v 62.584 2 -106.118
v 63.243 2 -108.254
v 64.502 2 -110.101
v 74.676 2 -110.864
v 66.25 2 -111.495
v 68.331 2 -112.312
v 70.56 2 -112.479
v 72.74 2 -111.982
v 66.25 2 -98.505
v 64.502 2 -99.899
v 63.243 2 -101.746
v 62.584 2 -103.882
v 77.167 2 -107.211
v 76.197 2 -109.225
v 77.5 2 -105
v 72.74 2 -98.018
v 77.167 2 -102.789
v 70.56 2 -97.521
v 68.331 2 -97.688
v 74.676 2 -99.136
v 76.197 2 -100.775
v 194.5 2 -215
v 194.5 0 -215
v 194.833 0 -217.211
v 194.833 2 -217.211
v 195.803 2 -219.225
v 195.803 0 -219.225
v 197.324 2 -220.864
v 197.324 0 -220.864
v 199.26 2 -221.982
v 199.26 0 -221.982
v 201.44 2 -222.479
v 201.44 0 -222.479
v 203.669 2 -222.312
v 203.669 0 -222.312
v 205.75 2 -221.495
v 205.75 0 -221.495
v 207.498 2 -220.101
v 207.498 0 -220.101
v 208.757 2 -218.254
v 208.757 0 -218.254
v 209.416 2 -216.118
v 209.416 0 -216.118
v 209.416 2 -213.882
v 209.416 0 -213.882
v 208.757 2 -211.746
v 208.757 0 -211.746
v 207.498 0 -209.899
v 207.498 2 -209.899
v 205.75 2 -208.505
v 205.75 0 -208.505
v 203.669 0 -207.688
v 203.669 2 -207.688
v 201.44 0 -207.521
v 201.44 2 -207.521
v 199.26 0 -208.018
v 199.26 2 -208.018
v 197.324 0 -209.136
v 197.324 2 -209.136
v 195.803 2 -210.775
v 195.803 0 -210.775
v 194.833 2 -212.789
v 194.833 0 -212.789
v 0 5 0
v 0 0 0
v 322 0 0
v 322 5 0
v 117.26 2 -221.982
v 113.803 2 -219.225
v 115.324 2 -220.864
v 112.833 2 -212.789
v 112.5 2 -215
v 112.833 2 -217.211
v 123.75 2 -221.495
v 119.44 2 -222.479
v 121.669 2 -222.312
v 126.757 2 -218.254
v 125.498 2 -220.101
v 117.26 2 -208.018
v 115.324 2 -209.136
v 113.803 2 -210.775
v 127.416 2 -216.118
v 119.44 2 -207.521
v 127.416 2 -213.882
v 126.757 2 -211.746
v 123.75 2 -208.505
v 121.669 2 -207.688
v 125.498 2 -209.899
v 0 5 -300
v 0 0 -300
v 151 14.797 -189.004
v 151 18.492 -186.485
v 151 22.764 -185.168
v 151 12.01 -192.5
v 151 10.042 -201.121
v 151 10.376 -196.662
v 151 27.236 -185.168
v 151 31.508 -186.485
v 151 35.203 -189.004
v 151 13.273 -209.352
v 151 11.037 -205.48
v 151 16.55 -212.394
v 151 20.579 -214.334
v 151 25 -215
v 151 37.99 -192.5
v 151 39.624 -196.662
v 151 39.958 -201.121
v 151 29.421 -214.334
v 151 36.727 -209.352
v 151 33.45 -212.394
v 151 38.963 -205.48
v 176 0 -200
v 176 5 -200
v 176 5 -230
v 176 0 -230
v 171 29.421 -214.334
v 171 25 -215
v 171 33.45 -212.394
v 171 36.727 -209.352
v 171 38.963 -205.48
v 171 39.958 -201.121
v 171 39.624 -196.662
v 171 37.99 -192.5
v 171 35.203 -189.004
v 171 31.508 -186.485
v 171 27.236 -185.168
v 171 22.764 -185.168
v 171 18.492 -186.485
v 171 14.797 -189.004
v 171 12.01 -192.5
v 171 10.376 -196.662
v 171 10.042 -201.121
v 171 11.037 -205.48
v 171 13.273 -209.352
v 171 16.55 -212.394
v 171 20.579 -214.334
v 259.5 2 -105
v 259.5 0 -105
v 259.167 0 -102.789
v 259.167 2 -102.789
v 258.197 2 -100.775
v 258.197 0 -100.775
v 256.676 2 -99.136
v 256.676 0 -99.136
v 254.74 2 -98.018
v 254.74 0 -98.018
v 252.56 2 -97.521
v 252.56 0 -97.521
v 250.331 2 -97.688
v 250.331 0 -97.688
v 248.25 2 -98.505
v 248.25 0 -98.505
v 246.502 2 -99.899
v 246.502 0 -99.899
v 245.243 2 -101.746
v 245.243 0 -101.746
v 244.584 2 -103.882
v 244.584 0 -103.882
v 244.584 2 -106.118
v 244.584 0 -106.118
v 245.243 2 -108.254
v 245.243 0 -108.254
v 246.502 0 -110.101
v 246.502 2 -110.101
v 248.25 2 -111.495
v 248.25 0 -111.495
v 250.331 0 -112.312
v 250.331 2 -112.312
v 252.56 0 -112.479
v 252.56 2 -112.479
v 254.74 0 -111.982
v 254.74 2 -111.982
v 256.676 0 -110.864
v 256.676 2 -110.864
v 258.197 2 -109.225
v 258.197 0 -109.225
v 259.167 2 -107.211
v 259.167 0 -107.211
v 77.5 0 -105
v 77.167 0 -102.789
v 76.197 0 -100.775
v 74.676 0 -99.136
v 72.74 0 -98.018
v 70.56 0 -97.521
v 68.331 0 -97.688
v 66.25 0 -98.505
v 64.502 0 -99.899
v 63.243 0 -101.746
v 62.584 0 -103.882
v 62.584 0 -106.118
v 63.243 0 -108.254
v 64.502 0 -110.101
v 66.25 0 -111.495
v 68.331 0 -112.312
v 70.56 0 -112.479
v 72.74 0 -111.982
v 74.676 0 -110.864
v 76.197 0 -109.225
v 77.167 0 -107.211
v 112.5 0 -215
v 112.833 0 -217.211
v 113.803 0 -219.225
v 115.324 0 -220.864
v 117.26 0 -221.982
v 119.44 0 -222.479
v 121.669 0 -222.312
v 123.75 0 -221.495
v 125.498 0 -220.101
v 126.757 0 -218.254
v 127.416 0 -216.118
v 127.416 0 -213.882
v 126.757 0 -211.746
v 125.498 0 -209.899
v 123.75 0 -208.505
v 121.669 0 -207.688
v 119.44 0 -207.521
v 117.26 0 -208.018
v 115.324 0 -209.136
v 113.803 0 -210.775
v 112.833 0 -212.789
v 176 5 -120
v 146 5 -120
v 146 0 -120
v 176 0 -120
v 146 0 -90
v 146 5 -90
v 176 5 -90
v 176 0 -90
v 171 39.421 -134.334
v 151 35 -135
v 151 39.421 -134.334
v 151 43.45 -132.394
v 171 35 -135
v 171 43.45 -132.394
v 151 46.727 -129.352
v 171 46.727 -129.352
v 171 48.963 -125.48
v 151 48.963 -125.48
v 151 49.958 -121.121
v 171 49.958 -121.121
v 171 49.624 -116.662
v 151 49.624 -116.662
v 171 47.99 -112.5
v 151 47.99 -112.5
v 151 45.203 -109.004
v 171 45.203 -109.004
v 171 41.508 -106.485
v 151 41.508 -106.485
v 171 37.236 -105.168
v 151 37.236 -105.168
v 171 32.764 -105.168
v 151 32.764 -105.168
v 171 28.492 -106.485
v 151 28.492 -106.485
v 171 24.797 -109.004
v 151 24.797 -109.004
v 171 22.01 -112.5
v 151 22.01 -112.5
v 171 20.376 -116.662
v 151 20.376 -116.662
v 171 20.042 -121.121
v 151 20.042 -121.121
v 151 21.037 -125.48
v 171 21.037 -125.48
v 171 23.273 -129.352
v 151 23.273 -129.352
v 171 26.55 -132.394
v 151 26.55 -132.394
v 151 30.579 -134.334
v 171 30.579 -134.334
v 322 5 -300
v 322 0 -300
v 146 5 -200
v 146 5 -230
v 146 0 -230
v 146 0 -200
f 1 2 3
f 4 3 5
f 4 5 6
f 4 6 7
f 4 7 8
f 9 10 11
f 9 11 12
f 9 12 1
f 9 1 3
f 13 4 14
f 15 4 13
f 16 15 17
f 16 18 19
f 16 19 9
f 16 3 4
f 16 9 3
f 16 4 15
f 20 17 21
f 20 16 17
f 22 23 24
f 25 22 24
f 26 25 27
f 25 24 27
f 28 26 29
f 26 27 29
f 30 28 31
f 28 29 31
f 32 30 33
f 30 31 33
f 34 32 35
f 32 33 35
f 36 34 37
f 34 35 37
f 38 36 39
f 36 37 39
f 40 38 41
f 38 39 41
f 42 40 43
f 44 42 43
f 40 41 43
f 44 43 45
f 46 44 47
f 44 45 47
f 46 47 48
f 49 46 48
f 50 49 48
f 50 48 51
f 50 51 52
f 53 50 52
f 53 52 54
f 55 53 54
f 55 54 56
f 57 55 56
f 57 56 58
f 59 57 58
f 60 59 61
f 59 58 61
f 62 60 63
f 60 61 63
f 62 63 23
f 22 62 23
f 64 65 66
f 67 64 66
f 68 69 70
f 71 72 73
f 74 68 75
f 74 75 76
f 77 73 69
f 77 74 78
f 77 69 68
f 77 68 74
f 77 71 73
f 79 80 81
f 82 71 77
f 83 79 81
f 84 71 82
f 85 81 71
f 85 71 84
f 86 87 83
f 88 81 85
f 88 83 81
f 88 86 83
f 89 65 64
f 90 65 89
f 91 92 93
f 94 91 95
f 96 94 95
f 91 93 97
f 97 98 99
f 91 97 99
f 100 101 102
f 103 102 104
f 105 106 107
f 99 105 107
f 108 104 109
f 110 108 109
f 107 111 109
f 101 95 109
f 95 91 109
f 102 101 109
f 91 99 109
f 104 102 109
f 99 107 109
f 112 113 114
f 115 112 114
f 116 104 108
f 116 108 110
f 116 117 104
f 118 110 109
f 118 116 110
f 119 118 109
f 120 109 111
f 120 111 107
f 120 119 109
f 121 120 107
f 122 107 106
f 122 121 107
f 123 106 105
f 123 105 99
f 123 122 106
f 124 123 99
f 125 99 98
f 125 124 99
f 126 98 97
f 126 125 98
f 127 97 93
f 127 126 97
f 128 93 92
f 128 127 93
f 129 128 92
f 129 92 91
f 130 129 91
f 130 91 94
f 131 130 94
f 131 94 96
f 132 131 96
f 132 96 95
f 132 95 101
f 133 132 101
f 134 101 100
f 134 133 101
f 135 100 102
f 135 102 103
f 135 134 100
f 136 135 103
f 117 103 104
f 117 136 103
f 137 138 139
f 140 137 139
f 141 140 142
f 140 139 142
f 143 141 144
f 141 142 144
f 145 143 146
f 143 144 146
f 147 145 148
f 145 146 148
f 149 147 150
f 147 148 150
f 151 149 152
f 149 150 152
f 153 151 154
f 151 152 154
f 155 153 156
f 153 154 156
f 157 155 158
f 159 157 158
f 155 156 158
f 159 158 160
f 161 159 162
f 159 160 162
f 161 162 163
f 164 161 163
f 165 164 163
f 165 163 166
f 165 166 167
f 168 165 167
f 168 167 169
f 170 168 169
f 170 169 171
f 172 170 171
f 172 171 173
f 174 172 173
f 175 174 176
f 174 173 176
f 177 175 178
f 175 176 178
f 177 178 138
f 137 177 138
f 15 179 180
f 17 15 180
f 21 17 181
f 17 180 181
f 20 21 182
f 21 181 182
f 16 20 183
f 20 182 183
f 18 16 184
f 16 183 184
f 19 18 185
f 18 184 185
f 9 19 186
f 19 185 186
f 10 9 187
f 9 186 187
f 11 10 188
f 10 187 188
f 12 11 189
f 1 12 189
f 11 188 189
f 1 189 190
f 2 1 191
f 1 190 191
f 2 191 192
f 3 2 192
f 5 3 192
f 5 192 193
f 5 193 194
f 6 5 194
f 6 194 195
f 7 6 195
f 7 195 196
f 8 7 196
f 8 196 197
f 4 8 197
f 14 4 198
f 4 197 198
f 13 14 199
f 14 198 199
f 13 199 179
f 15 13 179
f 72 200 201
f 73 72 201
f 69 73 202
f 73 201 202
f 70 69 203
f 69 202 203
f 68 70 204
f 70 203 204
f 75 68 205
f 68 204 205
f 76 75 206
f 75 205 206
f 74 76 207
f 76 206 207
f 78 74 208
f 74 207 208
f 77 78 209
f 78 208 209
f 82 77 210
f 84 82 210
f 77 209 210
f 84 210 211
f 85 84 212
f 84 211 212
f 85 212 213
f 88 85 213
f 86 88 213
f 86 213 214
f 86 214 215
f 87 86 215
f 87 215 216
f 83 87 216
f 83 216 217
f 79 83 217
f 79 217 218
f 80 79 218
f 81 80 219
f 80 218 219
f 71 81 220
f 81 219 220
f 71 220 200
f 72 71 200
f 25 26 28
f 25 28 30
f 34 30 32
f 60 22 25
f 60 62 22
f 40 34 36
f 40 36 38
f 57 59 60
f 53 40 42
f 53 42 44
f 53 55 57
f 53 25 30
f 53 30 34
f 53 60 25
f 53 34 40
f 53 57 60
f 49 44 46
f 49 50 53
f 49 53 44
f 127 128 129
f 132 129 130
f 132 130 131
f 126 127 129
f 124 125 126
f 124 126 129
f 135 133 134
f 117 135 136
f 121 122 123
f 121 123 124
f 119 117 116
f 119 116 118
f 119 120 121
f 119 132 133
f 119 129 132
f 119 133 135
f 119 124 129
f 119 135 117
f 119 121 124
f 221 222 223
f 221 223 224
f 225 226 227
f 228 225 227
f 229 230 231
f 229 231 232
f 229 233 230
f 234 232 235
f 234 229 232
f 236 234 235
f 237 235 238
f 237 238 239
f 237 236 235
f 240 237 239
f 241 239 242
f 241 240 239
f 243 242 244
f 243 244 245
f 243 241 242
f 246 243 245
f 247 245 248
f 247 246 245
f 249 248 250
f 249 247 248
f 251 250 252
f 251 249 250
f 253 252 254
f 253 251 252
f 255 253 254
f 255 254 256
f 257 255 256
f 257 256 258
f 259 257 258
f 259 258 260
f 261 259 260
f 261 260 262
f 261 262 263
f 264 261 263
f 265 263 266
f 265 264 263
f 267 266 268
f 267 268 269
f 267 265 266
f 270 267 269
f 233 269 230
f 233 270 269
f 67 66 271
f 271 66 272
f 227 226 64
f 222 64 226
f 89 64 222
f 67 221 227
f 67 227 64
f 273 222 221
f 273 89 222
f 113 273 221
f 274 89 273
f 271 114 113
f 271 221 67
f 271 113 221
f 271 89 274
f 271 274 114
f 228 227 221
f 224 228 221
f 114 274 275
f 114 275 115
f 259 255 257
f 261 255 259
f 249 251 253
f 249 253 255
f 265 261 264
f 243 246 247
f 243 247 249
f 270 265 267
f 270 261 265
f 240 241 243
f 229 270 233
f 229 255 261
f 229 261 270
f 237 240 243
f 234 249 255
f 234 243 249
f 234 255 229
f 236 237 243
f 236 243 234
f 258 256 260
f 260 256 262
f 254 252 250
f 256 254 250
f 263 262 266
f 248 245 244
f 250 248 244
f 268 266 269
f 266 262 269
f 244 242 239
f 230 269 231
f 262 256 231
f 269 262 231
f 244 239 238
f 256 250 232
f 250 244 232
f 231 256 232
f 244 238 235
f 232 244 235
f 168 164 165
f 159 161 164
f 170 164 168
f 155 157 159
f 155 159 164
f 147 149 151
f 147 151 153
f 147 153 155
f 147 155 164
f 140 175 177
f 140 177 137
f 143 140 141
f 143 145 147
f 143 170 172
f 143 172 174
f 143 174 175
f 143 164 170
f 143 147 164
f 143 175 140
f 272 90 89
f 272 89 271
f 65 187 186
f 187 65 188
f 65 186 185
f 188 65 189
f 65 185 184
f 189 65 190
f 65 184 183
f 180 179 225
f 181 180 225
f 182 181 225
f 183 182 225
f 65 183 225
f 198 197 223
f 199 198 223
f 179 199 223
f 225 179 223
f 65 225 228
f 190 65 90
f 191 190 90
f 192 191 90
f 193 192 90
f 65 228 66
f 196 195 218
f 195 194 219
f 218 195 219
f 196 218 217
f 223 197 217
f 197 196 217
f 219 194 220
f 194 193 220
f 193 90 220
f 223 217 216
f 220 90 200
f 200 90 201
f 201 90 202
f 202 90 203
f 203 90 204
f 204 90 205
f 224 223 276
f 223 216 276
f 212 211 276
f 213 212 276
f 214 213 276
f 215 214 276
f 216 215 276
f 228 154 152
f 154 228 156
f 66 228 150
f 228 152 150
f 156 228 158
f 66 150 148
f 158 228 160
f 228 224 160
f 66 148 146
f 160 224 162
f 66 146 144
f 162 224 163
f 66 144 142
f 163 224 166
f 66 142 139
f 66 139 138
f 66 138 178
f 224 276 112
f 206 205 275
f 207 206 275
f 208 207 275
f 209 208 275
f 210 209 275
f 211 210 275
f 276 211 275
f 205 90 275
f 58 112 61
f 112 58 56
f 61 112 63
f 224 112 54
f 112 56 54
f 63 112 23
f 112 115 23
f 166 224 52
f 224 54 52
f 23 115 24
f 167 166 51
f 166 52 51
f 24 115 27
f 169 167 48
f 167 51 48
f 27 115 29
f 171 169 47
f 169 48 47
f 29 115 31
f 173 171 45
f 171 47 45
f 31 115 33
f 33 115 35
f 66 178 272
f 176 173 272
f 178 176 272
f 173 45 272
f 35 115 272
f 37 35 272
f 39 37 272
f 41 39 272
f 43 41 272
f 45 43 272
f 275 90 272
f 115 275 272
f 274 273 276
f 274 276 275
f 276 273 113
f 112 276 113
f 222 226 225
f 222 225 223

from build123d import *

# Parameters (mm, degrees)
SKETCH_1_W          = 322
SKETCH_1_H          = 300
EXTRUDE_1_DEPTH     = 5
SKETCH_2_W          = 30
SKETCH_2_H          = 30
CUT_EXTRUDE_1_DEPTH = 5
CUT_EXTRUDE_2_DEPTH = 2
CUT_EXTRUDE_3_DEPTH = 2
SKETCH_5_R          = 15
EXTRUDE_3_DEPTH     = 10
EXTRUDE_3_2_DEPTH   = 10


with BuildPart() as part:
    # 스케치1 → 보스-돌출1 (new body)
    with BuildSketch(Plane(origin=(0, 0, 0), x_dir=(1, 0, 0), z_dir=(0, 1, 0))):
        with Locations((161, 150)):
            Rectangle(SKETCH_1_W, SKETCH_1_H)
    extrude(amount=EXTRUDE_1_DEPTH)

    # 스케치2 → 컷-돌출1 (cut)
    with BuildSketch(Plane(origin=(0, 5, 0), x_dir=(1, 0, 0), z_dir=(0, 1, 0))):
        with Locations((161, 105)):
            Rectangle(SKETCH_2_W, SKETCH_2_H)
        with Locations((161, 215)):
            Rectangle(SKETCH_2_W, SKETCH_2_H)
    extrude(amount=-CUT_EXTRUDE_1_DEPTH, mode=Mode.SUBTRACT)

    # 스케치3 → 컷-돌출2 (cut)
    with BuildSketch(Plane.XZ):
        with BuildLine():
            ThreePointArc((62.5, -105), (70, -112.5), (77.5, -105))
            Line((77.5, -105), (62.5, -105))
        make_face()
        with BuildLine():
            Line((62.5, -105), (77.5, -105))
            ThreePointArc((77.5, -105), (70, -97.5), (62.5, -105))
        make_face()
        with BuildLine():
            ThreePointArc((244.5, -105), (252, -112.5), (259.5, -105))
            Line((259.5, -105), (244.5, -105))
        make_face()
        with BuildLine():
            Line((244.5, -105), (259.5, -105))
            ThreePointArc((259.5, -105), (252, -97.5), (244.5, -105))
        make_face()
    extrude(amount=-CUT_EXTRUDE_2_DEPTH, mode=Mode.SUBTRACT)

    # 스케치4 → 컷-돌출3 (cut)
    with BuildSketch(Plane.XZ):
        with BuildLine():
            ThreePointArc((209.5, -215), (202, -207.5), (194.5, -215))
            Line((194.5, -215), (209.5, -215))
        make_face()
        with BuildLine():
            Line((209.5, -215), (194.5, -215))
            ThreePointArc((194.5, -215), (202, -222.5), (209.5, -215))
        make_face()
        with BuildLine():
            ThreePointArc((127.5, -215), (120, -207.5), (112.5, -215))
            Line((112.5, -215), (127.5, -215))
        make_face()
        with BuildLine():
            Line((127.5, -215), (112.5, -215))
            ThreePointArc((112.5, -215), (120, -222.5), (127.5, -215))
        make_face()
    extrude(amount=-CUT_EXTRUDE_3_DEPTH, mode=Mode.SUBTRACT)


with BuildPart() as body_2:
    # 스케치5 → 보스-돌출3 (new, symmetric)
    with BuildSketch(Plane(origin=(161, 0, 0), x_dir=(0, 0, -1), z_dir=(1, 0, 0))):
        with Locations((120, 35)):
            Circle(SKETCH_5_R)
    extrude(amount=EXTRUDE_3_DEPTH, both=True)


with BuildPart() as body_3:
    # 스케치5 → Extrude 3 2 (new, symmetric)
    with BuildSketch(Plane(origin=(161, 0, 0), x_dir=(0, 0, -1), z_dir=(1, 0, 0))):
        with Locations((200, 25)):
            Circle(SKETCH_5_R)
    extrude(amount=EXTRUDE_3_2_DEPTH, both=True)


solid = Compound([part.part, body_2.part, body_3.part])
